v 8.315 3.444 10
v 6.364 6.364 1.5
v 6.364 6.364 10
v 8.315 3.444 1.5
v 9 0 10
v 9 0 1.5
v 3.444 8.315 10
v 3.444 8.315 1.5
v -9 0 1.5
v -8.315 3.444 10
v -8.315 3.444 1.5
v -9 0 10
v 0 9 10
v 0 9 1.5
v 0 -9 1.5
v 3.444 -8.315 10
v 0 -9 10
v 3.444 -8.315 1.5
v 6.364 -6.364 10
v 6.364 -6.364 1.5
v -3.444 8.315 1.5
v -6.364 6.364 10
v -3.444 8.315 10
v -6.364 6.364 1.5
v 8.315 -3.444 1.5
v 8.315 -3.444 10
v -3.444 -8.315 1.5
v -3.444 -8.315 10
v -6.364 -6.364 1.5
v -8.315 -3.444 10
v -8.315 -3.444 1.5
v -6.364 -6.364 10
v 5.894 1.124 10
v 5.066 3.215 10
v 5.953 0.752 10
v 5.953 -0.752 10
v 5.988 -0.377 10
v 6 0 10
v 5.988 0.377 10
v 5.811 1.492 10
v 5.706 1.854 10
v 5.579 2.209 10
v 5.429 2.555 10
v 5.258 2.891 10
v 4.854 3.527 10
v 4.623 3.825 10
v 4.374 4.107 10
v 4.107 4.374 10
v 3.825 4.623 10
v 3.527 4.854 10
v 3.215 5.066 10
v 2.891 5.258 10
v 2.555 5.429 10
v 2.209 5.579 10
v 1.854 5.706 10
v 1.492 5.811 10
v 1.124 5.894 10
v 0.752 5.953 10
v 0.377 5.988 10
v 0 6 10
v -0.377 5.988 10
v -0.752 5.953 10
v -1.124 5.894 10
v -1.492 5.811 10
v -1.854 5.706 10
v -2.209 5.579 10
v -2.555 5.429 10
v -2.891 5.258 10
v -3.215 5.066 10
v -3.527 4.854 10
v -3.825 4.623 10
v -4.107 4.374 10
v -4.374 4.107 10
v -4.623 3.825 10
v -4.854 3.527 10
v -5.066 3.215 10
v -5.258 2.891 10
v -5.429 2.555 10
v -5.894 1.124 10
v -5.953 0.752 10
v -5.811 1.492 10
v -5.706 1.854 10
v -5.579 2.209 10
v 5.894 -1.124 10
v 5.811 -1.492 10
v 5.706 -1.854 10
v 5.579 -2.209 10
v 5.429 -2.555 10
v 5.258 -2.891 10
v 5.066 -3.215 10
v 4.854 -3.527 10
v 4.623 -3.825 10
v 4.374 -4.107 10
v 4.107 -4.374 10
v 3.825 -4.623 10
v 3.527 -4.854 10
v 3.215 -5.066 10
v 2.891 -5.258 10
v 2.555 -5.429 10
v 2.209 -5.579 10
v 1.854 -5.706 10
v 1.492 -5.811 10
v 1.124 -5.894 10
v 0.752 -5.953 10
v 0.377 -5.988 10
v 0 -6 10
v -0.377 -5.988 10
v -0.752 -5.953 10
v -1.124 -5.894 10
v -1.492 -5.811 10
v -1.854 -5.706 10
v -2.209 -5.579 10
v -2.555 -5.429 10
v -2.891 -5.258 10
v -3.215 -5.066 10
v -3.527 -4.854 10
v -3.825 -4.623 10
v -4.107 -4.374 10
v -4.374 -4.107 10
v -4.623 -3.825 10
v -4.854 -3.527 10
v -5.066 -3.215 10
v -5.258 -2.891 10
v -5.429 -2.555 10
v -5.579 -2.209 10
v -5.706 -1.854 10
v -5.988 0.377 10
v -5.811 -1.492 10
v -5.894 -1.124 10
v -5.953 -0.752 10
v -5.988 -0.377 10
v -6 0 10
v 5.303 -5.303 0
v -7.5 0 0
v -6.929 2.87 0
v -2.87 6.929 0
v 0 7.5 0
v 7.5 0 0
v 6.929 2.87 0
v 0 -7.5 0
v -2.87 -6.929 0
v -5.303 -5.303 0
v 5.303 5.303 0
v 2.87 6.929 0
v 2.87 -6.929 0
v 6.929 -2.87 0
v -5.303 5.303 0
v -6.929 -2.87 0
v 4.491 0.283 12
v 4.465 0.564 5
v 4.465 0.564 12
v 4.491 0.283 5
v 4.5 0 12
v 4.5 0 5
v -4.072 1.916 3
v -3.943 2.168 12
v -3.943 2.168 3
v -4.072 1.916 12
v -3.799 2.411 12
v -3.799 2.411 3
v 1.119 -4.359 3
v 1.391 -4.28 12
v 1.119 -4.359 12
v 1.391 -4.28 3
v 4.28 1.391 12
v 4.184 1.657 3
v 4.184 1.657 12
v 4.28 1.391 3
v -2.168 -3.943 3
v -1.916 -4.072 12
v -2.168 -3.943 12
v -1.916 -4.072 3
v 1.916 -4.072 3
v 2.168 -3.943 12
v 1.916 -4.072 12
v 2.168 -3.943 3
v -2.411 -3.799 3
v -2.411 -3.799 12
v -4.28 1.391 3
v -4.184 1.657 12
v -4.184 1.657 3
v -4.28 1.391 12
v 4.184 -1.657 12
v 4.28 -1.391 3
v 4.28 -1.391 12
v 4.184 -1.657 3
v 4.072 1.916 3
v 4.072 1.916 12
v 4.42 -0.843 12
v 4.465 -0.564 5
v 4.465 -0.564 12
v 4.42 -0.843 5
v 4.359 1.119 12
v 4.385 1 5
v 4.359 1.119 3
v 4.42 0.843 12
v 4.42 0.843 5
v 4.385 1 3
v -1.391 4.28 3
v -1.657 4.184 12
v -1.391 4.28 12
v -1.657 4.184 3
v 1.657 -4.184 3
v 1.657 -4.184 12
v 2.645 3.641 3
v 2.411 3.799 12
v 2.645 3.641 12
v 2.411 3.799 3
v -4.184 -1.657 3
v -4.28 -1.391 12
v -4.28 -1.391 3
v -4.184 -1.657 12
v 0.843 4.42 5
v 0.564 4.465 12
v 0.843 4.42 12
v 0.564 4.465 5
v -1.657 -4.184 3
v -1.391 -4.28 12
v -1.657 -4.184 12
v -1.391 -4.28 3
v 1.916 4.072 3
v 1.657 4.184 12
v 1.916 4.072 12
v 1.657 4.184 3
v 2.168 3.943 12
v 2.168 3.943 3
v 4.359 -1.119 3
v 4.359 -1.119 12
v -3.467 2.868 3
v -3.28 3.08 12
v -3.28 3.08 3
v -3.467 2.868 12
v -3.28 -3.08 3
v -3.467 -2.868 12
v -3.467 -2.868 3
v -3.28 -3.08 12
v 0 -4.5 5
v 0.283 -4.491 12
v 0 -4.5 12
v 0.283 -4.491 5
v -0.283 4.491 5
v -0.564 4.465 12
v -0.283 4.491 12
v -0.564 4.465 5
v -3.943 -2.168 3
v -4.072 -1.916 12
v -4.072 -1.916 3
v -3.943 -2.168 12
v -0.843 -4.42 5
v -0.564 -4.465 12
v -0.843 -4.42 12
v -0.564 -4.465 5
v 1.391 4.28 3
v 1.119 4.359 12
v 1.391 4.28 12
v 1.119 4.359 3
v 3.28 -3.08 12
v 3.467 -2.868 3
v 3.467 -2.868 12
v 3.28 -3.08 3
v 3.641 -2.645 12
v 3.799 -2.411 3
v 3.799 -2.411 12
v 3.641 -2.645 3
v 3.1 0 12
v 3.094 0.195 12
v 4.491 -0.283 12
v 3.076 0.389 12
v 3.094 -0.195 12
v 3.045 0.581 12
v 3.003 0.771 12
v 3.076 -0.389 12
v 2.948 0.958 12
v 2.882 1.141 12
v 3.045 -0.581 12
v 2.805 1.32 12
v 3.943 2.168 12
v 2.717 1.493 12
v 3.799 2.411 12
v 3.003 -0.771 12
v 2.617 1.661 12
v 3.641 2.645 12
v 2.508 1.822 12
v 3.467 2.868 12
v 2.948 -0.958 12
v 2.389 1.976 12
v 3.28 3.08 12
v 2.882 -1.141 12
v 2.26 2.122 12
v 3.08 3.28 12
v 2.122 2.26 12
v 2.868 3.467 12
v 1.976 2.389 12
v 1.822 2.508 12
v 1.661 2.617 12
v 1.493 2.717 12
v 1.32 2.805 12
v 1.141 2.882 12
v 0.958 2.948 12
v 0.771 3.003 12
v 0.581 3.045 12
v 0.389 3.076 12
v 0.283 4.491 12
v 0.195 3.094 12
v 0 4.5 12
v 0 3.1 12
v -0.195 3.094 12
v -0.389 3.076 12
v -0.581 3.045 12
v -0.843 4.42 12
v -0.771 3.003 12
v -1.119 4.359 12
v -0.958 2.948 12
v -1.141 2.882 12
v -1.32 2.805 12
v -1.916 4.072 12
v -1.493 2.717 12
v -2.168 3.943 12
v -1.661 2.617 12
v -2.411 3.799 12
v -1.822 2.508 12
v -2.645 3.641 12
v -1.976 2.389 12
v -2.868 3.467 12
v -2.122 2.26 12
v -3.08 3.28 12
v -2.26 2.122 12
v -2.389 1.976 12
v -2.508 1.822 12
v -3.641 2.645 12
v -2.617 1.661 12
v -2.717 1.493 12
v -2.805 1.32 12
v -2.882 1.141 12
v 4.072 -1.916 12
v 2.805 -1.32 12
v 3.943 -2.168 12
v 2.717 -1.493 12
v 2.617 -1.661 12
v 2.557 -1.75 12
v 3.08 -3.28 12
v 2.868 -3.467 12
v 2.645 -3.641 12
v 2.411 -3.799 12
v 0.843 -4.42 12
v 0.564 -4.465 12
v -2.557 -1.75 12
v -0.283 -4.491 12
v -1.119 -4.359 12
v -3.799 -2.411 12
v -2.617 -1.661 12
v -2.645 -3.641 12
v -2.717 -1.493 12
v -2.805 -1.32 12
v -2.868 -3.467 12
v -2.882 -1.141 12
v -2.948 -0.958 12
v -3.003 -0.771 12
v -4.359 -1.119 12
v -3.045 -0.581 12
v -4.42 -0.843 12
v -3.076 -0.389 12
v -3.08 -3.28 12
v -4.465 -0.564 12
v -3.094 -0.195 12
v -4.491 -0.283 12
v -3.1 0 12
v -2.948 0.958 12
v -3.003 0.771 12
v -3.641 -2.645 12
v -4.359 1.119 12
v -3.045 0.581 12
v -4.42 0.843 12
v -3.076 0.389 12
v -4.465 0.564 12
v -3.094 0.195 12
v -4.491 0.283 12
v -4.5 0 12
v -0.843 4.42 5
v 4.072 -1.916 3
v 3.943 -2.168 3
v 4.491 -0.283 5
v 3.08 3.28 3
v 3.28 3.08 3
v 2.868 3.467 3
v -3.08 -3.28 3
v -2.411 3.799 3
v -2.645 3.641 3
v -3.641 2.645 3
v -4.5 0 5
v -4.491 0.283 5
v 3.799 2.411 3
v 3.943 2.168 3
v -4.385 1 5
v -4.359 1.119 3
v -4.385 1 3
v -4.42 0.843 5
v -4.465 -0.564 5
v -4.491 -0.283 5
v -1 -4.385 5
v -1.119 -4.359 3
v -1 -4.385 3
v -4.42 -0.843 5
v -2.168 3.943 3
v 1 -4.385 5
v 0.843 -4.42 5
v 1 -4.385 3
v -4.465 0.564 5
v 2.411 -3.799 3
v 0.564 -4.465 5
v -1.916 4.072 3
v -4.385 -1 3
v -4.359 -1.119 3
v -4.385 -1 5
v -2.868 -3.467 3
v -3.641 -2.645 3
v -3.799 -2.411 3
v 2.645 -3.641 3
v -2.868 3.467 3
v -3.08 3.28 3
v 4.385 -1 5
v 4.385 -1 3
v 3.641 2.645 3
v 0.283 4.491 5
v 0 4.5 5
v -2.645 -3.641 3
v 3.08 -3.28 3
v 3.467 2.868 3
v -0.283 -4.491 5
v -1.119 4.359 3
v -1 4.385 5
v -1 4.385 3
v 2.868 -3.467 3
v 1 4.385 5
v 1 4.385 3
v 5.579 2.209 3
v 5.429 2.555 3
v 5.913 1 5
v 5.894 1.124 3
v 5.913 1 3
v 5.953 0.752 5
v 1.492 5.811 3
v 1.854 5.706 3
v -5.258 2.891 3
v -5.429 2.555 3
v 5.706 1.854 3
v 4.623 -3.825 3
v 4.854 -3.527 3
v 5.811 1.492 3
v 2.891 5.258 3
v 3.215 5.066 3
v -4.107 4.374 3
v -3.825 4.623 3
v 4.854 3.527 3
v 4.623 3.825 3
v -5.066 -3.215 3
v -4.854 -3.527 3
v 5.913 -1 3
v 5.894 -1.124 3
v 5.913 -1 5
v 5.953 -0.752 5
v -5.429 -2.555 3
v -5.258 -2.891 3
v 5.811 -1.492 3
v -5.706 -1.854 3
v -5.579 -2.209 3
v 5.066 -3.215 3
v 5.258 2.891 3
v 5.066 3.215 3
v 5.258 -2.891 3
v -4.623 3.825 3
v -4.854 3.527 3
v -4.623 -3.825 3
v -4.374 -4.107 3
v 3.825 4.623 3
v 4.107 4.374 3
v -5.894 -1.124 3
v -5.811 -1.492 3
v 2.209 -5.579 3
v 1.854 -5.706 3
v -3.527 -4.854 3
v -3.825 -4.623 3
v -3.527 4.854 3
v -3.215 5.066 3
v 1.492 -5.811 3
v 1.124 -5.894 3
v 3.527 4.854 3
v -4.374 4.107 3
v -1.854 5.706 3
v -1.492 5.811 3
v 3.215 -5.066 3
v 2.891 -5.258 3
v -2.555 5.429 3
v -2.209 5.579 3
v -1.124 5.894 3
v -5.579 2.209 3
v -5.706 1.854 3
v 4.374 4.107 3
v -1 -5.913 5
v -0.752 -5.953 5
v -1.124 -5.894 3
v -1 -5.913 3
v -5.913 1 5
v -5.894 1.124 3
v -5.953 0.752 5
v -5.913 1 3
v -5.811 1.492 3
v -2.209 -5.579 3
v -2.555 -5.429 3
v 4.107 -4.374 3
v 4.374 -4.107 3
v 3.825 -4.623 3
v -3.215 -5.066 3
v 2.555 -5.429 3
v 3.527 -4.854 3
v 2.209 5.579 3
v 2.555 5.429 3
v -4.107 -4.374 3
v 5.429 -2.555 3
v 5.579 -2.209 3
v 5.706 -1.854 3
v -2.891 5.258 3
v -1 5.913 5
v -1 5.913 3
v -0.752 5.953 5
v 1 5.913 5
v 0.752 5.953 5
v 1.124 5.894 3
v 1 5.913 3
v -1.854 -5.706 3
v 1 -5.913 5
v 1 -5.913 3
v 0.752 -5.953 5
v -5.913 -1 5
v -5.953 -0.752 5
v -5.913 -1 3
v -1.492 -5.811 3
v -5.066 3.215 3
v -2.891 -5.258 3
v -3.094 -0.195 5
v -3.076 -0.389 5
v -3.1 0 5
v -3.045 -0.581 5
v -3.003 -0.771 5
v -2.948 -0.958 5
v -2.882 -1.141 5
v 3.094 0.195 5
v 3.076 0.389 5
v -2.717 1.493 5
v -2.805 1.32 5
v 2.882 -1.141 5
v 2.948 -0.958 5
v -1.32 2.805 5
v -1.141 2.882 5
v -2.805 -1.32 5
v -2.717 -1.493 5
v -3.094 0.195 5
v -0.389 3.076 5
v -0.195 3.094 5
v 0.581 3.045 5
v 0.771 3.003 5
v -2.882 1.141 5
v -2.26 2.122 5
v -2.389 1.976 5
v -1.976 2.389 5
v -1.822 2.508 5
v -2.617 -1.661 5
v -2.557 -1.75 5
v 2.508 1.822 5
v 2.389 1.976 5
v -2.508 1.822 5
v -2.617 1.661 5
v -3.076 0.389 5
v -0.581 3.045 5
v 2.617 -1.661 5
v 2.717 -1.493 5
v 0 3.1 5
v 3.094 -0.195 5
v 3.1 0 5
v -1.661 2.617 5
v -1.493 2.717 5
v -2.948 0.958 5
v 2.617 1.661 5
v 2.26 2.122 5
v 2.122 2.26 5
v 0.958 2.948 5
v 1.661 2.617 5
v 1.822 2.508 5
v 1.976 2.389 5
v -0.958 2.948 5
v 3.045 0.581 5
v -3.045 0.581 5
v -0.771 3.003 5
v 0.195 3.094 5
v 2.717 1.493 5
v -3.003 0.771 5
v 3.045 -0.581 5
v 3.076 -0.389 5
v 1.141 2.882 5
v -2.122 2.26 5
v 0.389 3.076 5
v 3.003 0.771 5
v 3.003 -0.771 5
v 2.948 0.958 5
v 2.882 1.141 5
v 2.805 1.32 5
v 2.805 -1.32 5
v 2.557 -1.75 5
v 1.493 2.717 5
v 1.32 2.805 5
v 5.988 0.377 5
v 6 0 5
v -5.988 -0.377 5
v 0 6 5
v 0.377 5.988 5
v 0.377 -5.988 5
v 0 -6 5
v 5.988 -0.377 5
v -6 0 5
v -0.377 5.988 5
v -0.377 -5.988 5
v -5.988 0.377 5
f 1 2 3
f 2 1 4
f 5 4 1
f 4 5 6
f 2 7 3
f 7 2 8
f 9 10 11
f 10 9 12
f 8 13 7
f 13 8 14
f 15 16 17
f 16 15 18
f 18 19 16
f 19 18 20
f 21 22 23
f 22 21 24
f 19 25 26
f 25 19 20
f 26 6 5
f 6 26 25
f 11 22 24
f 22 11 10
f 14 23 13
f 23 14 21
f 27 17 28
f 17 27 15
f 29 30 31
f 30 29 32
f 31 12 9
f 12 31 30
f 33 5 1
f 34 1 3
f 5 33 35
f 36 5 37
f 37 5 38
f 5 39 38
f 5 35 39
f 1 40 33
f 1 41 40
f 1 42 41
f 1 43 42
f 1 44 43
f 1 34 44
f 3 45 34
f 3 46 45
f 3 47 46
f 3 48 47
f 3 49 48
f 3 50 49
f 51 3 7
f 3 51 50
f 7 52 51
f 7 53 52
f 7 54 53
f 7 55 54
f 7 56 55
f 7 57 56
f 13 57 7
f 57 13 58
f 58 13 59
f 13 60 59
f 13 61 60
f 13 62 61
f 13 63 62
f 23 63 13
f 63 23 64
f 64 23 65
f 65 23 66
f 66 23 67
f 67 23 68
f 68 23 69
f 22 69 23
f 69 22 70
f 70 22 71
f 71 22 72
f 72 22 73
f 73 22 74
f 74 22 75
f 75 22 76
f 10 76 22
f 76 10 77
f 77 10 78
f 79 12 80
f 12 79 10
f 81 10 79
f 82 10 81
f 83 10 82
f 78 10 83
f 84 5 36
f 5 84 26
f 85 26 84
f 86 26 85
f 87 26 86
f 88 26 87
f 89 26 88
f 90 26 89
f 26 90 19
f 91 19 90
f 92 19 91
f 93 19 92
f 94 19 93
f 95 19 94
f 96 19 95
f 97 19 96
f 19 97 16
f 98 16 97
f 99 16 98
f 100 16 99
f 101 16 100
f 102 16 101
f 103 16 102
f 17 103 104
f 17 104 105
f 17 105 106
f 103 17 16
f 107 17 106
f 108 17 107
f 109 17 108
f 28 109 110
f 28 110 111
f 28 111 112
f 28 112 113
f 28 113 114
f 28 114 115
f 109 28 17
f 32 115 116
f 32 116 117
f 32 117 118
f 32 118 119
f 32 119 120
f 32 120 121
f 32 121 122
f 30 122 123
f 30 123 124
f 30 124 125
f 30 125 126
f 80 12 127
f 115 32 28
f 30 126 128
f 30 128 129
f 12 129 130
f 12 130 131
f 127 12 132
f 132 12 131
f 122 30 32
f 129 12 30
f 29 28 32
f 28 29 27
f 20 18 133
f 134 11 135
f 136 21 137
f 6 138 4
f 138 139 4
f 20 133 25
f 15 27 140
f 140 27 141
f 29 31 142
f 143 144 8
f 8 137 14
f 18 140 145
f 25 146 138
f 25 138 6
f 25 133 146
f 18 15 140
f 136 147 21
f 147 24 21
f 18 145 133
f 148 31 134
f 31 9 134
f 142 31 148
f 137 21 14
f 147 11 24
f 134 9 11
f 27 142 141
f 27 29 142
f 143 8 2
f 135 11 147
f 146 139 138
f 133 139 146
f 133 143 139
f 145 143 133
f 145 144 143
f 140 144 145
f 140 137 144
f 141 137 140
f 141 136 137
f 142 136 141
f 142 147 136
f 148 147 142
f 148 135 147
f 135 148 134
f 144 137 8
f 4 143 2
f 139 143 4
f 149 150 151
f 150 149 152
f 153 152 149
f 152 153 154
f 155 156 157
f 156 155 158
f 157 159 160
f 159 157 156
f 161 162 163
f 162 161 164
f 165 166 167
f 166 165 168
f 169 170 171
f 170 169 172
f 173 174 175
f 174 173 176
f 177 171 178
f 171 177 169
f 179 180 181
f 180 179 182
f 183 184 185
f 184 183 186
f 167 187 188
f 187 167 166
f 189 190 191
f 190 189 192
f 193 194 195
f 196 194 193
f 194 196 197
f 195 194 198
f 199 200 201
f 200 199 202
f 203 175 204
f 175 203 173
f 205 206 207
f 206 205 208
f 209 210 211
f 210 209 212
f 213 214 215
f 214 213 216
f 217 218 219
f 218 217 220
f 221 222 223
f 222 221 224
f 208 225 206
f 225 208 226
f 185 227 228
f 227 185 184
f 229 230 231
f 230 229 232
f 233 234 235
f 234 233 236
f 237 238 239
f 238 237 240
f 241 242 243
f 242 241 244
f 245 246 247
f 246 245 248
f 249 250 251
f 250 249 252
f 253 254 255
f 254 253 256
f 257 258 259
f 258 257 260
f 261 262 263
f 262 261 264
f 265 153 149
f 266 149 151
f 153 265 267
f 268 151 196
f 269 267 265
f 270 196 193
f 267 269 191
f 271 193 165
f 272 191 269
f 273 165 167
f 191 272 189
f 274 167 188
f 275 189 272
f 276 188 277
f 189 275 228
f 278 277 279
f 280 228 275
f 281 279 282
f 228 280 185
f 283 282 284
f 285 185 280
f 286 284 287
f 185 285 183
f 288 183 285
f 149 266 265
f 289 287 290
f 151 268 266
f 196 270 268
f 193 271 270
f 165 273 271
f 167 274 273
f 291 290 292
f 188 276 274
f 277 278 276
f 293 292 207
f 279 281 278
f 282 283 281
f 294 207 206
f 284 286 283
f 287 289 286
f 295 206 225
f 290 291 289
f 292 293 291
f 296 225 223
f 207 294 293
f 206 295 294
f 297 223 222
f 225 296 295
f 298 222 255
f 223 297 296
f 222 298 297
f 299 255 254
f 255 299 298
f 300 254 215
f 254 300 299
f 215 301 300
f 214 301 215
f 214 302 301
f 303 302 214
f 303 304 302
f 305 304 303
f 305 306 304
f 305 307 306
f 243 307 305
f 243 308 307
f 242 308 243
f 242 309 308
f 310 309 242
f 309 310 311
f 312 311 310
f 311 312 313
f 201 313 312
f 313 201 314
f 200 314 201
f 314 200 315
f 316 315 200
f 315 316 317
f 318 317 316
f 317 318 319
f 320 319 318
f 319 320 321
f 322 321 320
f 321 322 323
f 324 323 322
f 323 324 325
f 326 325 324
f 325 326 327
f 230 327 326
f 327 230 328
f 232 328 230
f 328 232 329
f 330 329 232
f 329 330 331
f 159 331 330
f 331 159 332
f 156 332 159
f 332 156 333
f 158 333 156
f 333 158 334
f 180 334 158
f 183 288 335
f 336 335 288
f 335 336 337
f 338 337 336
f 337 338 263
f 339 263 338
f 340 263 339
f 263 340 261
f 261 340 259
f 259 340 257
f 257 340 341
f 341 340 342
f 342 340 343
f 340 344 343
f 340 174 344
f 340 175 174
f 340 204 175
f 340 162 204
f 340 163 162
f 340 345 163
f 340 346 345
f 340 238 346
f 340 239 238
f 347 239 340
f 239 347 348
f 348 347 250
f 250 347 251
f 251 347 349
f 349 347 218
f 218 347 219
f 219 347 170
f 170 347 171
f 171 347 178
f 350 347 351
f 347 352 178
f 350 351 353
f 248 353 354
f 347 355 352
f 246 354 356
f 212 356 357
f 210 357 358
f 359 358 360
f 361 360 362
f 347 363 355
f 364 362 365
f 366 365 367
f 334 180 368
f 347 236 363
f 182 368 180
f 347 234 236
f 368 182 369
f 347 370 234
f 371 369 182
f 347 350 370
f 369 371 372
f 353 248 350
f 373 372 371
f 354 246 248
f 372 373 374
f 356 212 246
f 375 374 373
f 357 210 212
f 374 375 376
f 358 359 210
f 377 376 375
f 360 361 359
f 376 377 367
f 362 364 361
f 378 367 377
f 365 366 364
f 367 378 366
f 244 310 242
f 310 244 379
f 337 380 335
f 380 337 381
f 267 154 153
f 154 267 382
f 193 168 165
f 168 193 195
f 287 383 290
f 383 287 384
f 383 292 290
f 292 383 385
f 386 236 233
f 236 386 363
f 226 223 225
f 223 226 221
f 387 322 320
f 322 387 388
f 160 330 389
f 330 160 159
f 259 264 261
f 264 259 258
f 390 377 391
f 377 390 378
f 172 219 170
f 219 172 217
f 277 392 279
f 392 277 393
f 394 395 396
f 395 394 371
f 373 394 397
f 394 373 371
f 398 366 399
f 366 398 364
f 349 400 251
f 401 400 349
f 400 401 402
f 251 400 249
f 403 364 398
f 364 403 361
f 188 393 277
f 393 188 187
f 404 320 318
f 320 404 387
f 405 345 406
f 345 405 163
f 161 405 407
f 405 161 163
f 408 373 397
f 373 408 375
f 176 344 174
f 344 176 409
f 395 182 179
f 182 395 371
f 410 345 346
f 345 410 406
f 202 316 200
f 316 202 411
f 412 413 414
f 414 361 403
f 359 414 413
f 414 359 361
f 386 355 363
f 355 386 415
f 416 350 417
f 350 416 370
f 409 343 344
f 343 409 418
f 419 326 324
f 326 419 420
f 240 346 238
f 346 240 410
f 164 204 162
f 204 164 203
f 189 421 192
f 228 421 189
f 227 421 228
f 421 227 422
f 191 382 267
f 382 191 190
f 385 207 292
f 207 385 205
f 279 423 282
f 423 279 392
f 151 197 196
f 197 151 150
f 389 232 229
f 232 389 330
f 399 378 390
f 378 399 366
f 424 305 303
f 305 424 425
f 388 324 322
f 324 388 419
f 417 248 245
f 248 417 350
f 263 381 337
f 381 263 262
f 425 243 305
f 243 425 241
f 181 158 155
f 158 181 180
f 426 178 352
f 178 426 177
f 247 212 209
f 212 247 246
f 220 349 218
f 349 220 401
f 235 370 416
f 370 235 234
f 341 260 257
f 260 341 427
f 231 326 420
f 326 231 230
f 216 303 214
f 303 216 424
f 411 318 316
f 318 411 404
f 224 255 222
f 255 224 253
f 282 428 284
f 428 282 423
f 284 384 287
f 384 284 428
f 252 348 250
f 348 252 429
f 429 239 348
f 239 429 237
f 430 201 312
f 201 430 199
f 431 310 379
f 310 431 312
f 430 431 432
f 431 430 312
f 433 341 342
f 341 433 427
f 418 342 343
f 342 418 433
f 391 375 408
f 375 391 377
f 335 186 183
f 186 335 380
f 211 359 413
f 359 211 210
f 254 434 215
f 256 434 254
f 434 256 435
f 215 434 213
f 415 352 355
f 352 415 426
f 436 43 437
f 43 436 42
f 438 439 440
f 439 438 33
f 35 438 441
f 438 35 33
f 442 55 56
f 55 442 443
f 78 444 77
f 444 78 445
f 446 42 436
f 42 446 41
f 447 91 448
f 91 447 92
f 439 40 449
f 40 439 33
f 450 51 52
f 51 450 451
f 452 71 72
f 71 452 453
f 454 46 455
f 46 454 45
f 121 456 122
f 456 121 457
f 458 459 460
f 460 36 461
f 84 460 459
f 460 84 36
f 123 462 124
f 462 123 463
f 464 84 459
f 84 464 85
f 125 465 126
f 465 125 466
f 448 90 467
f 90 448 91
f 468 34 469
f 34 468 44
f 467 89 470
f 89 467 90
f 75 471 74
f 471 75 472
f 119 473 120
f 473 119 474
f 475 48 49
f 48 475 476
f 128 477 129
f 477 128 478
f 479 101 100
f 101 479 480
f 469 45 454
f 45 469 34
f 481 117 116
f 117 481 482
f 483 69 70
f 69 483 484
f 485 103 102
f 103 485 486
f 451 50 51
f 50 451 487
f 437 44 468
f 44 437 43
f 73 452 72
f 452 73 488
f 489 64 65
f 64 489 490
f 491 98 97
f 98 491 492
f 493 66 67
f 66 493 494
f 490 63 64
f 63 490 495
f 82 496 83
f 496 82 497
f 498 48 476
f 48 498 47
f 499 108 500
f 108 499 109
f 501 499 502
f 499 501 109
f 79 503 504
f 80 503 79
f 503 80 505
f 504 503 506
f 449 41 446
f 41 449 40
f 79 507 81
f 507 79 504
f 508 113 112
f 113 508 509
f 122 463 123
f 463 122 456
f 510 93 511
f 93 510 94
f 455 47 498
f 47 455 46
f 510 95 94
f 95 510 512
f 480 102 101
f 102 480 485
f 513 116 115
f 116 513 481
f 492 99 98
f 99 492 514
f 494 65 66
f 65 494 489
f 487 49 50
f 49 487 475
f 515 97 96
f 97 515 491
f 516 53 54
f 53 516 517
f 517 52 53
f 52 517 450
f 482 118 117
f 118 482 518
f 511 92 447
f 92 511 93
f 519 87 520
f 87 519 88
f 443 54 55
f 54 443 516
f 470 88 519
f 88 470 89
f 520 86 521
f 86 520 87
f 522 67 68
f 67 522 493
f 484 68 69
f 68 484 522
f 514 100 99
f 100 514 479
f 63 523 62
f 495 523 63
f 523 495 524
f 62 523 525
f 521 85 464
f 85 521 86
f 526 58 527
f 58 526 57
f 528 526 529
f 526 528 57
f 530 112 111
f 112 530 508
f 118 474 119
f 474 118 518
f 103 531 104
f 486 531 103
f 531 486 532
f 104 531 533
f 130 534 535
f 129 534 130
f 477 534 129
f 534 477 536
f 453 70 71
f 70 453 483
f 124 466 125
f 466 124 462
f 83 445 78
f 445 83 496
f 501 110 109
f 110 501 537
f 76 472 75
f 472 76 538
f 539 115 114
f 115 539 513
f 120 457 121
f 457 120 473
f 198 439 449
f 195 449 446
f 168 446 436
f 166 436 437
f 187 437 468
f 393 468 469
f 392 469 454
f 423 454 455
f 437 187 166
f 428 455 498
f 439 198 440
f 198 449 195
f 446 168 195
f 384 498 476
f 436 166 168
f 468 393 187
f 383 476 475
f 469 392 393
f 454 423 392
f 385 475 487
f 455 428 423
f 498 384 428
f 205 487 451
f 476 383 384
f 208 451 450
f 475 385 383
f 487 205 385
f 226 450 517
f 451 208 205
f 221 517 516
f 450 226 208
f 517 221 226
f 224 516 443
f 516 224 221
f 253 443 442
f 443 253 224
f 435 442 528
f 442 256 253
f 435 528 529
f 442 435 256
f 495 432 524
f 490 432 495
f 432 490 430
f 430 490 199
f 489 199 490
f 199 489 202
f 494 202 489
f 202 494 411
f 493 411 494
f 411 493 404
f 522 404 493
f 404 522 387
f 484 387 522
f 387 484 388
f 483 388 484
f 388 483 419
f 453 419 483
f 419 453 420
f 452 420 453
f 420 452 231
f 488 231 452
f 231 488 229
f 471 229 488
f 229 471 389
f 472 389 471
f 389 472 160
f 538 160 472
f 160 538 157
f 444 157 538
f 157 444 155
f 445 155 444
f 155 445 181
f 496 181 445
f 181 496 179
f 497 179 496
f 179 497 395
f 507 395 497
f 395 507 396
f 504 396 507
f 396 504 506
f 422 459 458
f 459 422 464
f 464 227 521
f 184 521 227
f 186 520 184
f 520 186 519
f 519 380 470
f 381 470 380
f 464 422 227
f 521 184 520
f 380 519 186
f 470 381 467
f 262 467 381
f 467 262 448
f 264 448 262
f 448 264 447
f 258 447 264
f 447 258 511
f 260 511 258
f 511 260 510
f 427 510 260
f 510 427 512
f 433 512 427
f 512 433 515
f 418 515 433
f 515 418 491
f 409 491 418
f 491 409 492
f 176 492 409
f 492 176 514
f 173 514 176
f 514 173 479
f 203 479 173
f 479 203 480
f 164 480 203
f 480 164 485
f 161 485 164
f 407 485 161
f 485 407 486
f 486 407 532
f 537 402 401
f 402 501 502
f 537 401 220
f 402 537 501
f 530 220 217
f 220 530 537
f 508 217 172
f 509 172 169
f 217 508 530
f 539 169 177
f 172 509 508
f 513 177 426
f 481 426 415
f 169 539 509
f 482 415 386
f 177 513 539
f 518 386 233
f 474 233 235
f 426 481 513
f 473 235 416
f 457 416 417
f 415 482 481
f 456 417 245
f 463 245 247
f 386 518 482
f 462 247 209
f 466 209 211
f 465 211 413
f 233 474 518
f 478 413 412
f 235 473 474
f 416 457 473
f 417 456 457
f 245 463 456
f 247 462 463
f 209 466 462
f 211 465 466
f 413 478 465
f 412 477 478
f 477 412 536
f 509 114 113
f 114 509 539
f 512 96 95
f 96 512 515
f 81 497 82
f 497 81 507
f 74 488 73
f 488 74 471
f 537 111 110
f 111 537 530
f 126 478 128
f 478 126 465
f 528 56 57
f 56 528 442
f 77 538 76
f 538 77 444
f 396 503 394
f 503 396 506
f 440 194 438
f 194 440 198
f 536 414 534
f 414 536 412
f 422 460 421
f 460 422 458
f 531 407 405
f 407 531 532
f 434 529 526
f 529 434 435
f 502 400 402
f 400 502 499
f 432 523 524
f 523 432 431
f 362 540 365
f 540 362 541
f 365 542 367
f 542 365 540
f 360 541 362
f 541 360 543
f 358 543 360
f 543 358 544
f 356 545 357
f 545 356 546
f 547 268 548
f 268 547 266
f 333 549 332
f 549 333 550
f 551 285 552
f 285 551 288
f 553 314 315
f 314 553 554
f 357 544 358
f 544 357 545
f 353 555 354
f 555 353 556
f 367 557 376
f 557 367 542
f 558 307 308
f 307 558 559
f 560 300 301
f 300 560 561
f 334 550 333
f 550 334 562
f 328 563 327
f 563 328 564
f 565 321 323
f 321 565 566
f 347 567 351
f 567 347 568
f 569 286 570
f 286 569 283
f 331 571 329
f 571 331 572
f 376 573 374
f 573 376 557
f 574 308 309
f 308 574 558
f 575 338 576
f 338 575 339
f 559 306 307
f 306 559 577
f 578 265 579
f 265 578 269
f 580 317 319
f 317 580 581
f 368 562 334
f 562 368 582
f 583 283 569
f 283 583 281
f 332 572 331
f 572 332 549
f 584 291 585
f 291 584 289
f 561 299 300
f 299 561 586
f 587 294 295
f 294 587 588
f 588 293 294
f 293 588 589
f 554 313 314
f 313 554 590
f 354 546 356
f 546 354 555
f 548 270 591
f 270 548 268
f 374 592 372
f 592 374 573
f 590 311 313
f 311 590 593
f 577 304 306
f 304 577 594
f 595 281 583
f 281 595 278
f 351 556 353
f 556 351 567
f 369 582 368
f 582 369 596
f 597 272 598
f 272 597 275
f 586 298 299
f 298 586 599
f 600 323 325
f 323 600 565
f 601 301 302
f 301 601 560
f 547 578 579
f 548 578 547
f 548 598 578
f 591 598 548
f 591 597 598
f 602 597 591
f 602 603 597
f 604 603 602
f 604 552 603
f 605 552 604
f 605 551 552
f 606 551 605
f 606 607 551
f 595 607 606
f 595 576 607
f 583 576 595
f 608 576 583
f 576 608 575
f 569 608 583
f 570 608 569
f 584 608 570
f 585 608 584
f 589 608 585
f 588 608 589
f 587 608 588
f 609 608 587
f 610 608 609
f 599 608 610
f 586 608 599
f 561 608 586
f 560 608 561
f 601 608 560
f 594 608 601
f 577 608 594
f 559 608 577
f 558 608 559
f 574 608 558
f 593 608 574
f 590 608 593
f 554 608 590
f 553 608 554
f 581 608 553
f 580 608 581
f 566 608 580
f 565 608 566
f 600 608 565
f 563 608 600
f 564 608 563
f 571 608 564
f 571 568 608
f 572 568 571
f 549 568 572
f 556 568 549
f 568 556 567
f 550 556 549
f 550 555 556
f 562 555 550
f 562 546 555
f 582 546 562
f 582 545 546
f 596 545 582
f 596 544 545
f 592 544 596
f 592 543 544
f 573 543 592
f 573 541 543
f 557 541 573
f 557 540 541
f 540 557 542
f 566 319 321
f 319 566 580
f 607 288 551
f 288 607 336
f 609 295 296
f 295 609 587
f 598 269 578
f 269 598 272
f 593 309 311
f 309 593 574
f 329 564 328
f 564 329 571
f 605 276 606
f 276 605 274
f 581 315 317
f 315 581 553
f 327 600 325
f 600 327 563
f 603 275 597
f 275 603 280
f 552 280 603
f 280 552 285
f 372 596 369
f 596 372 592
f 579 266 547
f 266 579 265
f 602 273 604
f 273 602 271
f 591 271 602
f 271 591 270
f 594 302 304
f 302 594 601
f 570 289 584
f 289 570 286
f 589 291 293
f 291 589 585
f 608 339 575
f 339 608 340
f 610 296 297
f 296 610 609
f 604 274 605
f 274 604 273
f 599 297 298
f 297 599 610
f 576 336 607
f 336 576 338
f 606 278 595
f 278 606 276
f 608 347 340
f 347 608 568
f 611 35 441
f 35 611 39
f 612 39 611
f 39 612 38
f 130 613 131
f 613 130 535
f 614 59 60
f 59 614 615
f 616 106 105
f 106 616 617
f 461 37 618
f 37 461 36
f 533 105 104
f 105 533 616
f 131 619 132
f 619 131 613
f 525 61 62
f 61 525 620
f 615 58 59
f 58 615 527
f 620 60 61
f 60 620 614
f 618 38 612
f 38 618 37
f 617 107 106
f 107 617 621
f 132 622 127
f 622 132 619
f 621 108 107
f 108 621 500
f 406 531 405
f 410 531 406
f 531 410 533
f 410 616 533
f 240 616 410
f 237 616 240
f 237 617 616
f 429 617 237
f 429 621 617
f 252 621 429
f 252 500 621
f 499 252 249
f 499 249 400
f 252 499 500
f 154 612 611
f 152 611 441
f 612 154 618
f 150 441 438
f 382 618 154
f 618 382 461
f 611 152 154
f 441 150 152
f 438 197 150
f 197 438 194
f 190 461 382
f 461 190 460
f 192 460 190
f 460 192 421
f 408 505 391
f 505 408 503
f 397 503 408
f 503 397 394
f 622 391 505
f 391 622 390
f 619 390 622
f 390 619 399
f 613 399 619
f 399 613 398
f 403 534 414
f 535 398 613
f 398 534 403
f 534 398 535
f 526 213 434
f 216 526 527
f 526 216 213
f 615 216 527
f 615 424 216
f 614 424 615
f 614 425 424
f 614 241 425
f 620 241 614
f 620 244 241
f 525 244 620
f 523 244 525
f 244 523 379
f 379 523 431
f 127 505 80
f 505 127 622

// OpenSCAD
// From DefProc on GitHub
// D Shaft knob for Dell keyboard
/* [Design Variables] */
//in mm
height = 10;
//in mm (set to measured value, clearance is added)
shaft_diameter =  6.1;
//in mm (set to measured value, clearance is added)
D_width = 4.7;
//in mm
outer_diameter = 18;
//in mm
wall_thickness = 3;
//in mm
inner_diameter = 9;
//in mm
shaft_length = 5;
//in mm
plunge_depth = 2;
//in mm
clearance_height = 5;

/* [Cosmetic Settings] */
no_sides =16;
//in mm (0 for no chamfer)
top_chamfer=1.5;

/* [Zero Pointer] */
with_pointer = "no"; // [yes,no]
//in mm
point_size = 5;
//degrees clockwise from the flat side
point_angle = 90; 

/* [Additional Features] */
extra_feature="scollops"; // [none,scollops,taps,cutaway]
number_of_features=0;
//degrees
offset_angle=-30;

tap_height=3*1;
clearance = 0.1*1;
stiffener_thickness = 2*1; // mm
$fn = 	100*1;

module knob() {
	difference() {
		difference(){
			union() {
				difference() {
					overall_knob();
					hollow_torus();
				}
				internal_supports();
			}
			D_shaft_hole();
		}
		internal_clearance();
	}
}

module overall_knob() {
	union() {
		translate([0,0,top_chamfer]) cylinder(h=height-top_chamfer, r=outer_diameter/2, $fn=no_sides);
		cylinder(h=top_chamfer, r1=-top_chamfer+outer_diameter/2, r2=outer_diameter/2, $fn=no_sides);
		translate([0,0,height]) cylinder(h=(plunge_depth), r=(inner_diameter/2));
	}
}

module hollow_torus() {
	translate([0,0,(wall_thickness)]) difference() {
		cylinder(h=height, r=(outer_diameter/2)-wall_thickness);
		translate([0,0,-1]) cylinder(h=height+2, r=inner_diameter/2);
	}
}

module internal_supports() {
	translate([0,0,(top_chamfer+height)/2]) cube(size=[outer_diameter-wall_thickness, stiffener_thickness, height-top_chamfer], center=true);
	translate([0,0,(top_chamfer+height)/2]) cube(size=[stiffener_thickness, outer_diameter-wall_thickness, height-top_chamfer], center=true);
}

module D_shaft_hole() {
	rotate([0,0,-90-point_angle]) {
		translate([0,0,(height-shaft_length)]) difference() {
			cylinder(h=(shaft_length+plunge_depth+2), r=(shaft_diameter+clearance)/2);
			translate([-shaft_diameter/2,((D_width+clearance)-shaft_diameter/2),-1]) cube(size=[shaft_diameter+clearance,shaft_diameter+clearance,shaft_length+plunge_depth+4]);
		}
	}
}

module internal_clearance() {
	translate([0,0,height-clearance_height]) difference() {
		cylinder(h=height, r=(outer_diameter/2)-wall_thickness);
		translate([0,0,-1]) cylinder(h=height+2, r=inner_diameter/2);
	}
}

module scollop() {
	rotate([0,0,offset_angle]) {
		for (i=[0:number_of_features]) {
				rotate([0,0,(360/number_of_features)*i]) translate([-outer_diameter/2,(outer_diameter/2)+(height/8)-(wall_thickness),height/3]) rotate([0,90,0]) cylinder(h=outer_diameter, r=height/8);
		}
	}
}

module scollop_wall() {
	intersection() {
		translate([0,0,top_chamfer]) cylinder(h=height-top_chamfer, r=outer_diameter/2, $fn=no_sides);
		rotate([0,0,offset_angle]) {
			for (i=[0:number_of_features]) {
				rotate([0,0,(360/number_of_features)*i]) translate([-outer_diameter/2,(outer_diameter/2)+(height/8)-(wall_thickness),height/3]) rotate([0,90,0]) cylinder(h=outer_diameter, r=(height/8)+wall_thickness);
			}
		}
	};
}

module taps() {
	difference() {
		for (i=[0:number_of_features]) {
			rotate([0,0,(360/number_of_features)*i+offset_angle]) {
				minkowski() {
					hull() {
						translate([0,0,0]) cylinder(h=tap_height*2, r=1);
						translate([-outer_diameter/1.25,0,0]) cylinder(h=tap_height, r=outer_diameter/10);
					}
					translate([0,0,tap_height]) sphere(r=tap_height/2, $fn=5);
				}
			}
		}
		cylinder(h=height, r=(outer_diameter/2)-wall_thickness);
	}
}

if(extra_feature=="scollops") {
	difference() {
		scollop_wall();
		scollop();
	}
	difference() {
		knob();
		scollop();
	}
} else if(extra_feature=="taps") {
	knob();
	taps();
} else if(extra_feature=="cutaway") {
	difference() {
		knob();
		translate([0,0,-1]) cube([1000,1000,1000]);
	}
}else {
	knob();
}

if(with_pointer=="yes") {
	// zero marker
	translate([outer_diameter/2,0,0]) {
		polyhedron(
			points=[
				[point_size,0,height],[-wall_thickness/3,-point_size/2,height],[-wall_thickness/3,point_size/2,height],
				[0,0,top_chamfer]
			],
			triangles=[
				[0,1,2],
				[0,3,1],
				[0,2,3],
				[2,1,3]
			]
		);
	}
}
